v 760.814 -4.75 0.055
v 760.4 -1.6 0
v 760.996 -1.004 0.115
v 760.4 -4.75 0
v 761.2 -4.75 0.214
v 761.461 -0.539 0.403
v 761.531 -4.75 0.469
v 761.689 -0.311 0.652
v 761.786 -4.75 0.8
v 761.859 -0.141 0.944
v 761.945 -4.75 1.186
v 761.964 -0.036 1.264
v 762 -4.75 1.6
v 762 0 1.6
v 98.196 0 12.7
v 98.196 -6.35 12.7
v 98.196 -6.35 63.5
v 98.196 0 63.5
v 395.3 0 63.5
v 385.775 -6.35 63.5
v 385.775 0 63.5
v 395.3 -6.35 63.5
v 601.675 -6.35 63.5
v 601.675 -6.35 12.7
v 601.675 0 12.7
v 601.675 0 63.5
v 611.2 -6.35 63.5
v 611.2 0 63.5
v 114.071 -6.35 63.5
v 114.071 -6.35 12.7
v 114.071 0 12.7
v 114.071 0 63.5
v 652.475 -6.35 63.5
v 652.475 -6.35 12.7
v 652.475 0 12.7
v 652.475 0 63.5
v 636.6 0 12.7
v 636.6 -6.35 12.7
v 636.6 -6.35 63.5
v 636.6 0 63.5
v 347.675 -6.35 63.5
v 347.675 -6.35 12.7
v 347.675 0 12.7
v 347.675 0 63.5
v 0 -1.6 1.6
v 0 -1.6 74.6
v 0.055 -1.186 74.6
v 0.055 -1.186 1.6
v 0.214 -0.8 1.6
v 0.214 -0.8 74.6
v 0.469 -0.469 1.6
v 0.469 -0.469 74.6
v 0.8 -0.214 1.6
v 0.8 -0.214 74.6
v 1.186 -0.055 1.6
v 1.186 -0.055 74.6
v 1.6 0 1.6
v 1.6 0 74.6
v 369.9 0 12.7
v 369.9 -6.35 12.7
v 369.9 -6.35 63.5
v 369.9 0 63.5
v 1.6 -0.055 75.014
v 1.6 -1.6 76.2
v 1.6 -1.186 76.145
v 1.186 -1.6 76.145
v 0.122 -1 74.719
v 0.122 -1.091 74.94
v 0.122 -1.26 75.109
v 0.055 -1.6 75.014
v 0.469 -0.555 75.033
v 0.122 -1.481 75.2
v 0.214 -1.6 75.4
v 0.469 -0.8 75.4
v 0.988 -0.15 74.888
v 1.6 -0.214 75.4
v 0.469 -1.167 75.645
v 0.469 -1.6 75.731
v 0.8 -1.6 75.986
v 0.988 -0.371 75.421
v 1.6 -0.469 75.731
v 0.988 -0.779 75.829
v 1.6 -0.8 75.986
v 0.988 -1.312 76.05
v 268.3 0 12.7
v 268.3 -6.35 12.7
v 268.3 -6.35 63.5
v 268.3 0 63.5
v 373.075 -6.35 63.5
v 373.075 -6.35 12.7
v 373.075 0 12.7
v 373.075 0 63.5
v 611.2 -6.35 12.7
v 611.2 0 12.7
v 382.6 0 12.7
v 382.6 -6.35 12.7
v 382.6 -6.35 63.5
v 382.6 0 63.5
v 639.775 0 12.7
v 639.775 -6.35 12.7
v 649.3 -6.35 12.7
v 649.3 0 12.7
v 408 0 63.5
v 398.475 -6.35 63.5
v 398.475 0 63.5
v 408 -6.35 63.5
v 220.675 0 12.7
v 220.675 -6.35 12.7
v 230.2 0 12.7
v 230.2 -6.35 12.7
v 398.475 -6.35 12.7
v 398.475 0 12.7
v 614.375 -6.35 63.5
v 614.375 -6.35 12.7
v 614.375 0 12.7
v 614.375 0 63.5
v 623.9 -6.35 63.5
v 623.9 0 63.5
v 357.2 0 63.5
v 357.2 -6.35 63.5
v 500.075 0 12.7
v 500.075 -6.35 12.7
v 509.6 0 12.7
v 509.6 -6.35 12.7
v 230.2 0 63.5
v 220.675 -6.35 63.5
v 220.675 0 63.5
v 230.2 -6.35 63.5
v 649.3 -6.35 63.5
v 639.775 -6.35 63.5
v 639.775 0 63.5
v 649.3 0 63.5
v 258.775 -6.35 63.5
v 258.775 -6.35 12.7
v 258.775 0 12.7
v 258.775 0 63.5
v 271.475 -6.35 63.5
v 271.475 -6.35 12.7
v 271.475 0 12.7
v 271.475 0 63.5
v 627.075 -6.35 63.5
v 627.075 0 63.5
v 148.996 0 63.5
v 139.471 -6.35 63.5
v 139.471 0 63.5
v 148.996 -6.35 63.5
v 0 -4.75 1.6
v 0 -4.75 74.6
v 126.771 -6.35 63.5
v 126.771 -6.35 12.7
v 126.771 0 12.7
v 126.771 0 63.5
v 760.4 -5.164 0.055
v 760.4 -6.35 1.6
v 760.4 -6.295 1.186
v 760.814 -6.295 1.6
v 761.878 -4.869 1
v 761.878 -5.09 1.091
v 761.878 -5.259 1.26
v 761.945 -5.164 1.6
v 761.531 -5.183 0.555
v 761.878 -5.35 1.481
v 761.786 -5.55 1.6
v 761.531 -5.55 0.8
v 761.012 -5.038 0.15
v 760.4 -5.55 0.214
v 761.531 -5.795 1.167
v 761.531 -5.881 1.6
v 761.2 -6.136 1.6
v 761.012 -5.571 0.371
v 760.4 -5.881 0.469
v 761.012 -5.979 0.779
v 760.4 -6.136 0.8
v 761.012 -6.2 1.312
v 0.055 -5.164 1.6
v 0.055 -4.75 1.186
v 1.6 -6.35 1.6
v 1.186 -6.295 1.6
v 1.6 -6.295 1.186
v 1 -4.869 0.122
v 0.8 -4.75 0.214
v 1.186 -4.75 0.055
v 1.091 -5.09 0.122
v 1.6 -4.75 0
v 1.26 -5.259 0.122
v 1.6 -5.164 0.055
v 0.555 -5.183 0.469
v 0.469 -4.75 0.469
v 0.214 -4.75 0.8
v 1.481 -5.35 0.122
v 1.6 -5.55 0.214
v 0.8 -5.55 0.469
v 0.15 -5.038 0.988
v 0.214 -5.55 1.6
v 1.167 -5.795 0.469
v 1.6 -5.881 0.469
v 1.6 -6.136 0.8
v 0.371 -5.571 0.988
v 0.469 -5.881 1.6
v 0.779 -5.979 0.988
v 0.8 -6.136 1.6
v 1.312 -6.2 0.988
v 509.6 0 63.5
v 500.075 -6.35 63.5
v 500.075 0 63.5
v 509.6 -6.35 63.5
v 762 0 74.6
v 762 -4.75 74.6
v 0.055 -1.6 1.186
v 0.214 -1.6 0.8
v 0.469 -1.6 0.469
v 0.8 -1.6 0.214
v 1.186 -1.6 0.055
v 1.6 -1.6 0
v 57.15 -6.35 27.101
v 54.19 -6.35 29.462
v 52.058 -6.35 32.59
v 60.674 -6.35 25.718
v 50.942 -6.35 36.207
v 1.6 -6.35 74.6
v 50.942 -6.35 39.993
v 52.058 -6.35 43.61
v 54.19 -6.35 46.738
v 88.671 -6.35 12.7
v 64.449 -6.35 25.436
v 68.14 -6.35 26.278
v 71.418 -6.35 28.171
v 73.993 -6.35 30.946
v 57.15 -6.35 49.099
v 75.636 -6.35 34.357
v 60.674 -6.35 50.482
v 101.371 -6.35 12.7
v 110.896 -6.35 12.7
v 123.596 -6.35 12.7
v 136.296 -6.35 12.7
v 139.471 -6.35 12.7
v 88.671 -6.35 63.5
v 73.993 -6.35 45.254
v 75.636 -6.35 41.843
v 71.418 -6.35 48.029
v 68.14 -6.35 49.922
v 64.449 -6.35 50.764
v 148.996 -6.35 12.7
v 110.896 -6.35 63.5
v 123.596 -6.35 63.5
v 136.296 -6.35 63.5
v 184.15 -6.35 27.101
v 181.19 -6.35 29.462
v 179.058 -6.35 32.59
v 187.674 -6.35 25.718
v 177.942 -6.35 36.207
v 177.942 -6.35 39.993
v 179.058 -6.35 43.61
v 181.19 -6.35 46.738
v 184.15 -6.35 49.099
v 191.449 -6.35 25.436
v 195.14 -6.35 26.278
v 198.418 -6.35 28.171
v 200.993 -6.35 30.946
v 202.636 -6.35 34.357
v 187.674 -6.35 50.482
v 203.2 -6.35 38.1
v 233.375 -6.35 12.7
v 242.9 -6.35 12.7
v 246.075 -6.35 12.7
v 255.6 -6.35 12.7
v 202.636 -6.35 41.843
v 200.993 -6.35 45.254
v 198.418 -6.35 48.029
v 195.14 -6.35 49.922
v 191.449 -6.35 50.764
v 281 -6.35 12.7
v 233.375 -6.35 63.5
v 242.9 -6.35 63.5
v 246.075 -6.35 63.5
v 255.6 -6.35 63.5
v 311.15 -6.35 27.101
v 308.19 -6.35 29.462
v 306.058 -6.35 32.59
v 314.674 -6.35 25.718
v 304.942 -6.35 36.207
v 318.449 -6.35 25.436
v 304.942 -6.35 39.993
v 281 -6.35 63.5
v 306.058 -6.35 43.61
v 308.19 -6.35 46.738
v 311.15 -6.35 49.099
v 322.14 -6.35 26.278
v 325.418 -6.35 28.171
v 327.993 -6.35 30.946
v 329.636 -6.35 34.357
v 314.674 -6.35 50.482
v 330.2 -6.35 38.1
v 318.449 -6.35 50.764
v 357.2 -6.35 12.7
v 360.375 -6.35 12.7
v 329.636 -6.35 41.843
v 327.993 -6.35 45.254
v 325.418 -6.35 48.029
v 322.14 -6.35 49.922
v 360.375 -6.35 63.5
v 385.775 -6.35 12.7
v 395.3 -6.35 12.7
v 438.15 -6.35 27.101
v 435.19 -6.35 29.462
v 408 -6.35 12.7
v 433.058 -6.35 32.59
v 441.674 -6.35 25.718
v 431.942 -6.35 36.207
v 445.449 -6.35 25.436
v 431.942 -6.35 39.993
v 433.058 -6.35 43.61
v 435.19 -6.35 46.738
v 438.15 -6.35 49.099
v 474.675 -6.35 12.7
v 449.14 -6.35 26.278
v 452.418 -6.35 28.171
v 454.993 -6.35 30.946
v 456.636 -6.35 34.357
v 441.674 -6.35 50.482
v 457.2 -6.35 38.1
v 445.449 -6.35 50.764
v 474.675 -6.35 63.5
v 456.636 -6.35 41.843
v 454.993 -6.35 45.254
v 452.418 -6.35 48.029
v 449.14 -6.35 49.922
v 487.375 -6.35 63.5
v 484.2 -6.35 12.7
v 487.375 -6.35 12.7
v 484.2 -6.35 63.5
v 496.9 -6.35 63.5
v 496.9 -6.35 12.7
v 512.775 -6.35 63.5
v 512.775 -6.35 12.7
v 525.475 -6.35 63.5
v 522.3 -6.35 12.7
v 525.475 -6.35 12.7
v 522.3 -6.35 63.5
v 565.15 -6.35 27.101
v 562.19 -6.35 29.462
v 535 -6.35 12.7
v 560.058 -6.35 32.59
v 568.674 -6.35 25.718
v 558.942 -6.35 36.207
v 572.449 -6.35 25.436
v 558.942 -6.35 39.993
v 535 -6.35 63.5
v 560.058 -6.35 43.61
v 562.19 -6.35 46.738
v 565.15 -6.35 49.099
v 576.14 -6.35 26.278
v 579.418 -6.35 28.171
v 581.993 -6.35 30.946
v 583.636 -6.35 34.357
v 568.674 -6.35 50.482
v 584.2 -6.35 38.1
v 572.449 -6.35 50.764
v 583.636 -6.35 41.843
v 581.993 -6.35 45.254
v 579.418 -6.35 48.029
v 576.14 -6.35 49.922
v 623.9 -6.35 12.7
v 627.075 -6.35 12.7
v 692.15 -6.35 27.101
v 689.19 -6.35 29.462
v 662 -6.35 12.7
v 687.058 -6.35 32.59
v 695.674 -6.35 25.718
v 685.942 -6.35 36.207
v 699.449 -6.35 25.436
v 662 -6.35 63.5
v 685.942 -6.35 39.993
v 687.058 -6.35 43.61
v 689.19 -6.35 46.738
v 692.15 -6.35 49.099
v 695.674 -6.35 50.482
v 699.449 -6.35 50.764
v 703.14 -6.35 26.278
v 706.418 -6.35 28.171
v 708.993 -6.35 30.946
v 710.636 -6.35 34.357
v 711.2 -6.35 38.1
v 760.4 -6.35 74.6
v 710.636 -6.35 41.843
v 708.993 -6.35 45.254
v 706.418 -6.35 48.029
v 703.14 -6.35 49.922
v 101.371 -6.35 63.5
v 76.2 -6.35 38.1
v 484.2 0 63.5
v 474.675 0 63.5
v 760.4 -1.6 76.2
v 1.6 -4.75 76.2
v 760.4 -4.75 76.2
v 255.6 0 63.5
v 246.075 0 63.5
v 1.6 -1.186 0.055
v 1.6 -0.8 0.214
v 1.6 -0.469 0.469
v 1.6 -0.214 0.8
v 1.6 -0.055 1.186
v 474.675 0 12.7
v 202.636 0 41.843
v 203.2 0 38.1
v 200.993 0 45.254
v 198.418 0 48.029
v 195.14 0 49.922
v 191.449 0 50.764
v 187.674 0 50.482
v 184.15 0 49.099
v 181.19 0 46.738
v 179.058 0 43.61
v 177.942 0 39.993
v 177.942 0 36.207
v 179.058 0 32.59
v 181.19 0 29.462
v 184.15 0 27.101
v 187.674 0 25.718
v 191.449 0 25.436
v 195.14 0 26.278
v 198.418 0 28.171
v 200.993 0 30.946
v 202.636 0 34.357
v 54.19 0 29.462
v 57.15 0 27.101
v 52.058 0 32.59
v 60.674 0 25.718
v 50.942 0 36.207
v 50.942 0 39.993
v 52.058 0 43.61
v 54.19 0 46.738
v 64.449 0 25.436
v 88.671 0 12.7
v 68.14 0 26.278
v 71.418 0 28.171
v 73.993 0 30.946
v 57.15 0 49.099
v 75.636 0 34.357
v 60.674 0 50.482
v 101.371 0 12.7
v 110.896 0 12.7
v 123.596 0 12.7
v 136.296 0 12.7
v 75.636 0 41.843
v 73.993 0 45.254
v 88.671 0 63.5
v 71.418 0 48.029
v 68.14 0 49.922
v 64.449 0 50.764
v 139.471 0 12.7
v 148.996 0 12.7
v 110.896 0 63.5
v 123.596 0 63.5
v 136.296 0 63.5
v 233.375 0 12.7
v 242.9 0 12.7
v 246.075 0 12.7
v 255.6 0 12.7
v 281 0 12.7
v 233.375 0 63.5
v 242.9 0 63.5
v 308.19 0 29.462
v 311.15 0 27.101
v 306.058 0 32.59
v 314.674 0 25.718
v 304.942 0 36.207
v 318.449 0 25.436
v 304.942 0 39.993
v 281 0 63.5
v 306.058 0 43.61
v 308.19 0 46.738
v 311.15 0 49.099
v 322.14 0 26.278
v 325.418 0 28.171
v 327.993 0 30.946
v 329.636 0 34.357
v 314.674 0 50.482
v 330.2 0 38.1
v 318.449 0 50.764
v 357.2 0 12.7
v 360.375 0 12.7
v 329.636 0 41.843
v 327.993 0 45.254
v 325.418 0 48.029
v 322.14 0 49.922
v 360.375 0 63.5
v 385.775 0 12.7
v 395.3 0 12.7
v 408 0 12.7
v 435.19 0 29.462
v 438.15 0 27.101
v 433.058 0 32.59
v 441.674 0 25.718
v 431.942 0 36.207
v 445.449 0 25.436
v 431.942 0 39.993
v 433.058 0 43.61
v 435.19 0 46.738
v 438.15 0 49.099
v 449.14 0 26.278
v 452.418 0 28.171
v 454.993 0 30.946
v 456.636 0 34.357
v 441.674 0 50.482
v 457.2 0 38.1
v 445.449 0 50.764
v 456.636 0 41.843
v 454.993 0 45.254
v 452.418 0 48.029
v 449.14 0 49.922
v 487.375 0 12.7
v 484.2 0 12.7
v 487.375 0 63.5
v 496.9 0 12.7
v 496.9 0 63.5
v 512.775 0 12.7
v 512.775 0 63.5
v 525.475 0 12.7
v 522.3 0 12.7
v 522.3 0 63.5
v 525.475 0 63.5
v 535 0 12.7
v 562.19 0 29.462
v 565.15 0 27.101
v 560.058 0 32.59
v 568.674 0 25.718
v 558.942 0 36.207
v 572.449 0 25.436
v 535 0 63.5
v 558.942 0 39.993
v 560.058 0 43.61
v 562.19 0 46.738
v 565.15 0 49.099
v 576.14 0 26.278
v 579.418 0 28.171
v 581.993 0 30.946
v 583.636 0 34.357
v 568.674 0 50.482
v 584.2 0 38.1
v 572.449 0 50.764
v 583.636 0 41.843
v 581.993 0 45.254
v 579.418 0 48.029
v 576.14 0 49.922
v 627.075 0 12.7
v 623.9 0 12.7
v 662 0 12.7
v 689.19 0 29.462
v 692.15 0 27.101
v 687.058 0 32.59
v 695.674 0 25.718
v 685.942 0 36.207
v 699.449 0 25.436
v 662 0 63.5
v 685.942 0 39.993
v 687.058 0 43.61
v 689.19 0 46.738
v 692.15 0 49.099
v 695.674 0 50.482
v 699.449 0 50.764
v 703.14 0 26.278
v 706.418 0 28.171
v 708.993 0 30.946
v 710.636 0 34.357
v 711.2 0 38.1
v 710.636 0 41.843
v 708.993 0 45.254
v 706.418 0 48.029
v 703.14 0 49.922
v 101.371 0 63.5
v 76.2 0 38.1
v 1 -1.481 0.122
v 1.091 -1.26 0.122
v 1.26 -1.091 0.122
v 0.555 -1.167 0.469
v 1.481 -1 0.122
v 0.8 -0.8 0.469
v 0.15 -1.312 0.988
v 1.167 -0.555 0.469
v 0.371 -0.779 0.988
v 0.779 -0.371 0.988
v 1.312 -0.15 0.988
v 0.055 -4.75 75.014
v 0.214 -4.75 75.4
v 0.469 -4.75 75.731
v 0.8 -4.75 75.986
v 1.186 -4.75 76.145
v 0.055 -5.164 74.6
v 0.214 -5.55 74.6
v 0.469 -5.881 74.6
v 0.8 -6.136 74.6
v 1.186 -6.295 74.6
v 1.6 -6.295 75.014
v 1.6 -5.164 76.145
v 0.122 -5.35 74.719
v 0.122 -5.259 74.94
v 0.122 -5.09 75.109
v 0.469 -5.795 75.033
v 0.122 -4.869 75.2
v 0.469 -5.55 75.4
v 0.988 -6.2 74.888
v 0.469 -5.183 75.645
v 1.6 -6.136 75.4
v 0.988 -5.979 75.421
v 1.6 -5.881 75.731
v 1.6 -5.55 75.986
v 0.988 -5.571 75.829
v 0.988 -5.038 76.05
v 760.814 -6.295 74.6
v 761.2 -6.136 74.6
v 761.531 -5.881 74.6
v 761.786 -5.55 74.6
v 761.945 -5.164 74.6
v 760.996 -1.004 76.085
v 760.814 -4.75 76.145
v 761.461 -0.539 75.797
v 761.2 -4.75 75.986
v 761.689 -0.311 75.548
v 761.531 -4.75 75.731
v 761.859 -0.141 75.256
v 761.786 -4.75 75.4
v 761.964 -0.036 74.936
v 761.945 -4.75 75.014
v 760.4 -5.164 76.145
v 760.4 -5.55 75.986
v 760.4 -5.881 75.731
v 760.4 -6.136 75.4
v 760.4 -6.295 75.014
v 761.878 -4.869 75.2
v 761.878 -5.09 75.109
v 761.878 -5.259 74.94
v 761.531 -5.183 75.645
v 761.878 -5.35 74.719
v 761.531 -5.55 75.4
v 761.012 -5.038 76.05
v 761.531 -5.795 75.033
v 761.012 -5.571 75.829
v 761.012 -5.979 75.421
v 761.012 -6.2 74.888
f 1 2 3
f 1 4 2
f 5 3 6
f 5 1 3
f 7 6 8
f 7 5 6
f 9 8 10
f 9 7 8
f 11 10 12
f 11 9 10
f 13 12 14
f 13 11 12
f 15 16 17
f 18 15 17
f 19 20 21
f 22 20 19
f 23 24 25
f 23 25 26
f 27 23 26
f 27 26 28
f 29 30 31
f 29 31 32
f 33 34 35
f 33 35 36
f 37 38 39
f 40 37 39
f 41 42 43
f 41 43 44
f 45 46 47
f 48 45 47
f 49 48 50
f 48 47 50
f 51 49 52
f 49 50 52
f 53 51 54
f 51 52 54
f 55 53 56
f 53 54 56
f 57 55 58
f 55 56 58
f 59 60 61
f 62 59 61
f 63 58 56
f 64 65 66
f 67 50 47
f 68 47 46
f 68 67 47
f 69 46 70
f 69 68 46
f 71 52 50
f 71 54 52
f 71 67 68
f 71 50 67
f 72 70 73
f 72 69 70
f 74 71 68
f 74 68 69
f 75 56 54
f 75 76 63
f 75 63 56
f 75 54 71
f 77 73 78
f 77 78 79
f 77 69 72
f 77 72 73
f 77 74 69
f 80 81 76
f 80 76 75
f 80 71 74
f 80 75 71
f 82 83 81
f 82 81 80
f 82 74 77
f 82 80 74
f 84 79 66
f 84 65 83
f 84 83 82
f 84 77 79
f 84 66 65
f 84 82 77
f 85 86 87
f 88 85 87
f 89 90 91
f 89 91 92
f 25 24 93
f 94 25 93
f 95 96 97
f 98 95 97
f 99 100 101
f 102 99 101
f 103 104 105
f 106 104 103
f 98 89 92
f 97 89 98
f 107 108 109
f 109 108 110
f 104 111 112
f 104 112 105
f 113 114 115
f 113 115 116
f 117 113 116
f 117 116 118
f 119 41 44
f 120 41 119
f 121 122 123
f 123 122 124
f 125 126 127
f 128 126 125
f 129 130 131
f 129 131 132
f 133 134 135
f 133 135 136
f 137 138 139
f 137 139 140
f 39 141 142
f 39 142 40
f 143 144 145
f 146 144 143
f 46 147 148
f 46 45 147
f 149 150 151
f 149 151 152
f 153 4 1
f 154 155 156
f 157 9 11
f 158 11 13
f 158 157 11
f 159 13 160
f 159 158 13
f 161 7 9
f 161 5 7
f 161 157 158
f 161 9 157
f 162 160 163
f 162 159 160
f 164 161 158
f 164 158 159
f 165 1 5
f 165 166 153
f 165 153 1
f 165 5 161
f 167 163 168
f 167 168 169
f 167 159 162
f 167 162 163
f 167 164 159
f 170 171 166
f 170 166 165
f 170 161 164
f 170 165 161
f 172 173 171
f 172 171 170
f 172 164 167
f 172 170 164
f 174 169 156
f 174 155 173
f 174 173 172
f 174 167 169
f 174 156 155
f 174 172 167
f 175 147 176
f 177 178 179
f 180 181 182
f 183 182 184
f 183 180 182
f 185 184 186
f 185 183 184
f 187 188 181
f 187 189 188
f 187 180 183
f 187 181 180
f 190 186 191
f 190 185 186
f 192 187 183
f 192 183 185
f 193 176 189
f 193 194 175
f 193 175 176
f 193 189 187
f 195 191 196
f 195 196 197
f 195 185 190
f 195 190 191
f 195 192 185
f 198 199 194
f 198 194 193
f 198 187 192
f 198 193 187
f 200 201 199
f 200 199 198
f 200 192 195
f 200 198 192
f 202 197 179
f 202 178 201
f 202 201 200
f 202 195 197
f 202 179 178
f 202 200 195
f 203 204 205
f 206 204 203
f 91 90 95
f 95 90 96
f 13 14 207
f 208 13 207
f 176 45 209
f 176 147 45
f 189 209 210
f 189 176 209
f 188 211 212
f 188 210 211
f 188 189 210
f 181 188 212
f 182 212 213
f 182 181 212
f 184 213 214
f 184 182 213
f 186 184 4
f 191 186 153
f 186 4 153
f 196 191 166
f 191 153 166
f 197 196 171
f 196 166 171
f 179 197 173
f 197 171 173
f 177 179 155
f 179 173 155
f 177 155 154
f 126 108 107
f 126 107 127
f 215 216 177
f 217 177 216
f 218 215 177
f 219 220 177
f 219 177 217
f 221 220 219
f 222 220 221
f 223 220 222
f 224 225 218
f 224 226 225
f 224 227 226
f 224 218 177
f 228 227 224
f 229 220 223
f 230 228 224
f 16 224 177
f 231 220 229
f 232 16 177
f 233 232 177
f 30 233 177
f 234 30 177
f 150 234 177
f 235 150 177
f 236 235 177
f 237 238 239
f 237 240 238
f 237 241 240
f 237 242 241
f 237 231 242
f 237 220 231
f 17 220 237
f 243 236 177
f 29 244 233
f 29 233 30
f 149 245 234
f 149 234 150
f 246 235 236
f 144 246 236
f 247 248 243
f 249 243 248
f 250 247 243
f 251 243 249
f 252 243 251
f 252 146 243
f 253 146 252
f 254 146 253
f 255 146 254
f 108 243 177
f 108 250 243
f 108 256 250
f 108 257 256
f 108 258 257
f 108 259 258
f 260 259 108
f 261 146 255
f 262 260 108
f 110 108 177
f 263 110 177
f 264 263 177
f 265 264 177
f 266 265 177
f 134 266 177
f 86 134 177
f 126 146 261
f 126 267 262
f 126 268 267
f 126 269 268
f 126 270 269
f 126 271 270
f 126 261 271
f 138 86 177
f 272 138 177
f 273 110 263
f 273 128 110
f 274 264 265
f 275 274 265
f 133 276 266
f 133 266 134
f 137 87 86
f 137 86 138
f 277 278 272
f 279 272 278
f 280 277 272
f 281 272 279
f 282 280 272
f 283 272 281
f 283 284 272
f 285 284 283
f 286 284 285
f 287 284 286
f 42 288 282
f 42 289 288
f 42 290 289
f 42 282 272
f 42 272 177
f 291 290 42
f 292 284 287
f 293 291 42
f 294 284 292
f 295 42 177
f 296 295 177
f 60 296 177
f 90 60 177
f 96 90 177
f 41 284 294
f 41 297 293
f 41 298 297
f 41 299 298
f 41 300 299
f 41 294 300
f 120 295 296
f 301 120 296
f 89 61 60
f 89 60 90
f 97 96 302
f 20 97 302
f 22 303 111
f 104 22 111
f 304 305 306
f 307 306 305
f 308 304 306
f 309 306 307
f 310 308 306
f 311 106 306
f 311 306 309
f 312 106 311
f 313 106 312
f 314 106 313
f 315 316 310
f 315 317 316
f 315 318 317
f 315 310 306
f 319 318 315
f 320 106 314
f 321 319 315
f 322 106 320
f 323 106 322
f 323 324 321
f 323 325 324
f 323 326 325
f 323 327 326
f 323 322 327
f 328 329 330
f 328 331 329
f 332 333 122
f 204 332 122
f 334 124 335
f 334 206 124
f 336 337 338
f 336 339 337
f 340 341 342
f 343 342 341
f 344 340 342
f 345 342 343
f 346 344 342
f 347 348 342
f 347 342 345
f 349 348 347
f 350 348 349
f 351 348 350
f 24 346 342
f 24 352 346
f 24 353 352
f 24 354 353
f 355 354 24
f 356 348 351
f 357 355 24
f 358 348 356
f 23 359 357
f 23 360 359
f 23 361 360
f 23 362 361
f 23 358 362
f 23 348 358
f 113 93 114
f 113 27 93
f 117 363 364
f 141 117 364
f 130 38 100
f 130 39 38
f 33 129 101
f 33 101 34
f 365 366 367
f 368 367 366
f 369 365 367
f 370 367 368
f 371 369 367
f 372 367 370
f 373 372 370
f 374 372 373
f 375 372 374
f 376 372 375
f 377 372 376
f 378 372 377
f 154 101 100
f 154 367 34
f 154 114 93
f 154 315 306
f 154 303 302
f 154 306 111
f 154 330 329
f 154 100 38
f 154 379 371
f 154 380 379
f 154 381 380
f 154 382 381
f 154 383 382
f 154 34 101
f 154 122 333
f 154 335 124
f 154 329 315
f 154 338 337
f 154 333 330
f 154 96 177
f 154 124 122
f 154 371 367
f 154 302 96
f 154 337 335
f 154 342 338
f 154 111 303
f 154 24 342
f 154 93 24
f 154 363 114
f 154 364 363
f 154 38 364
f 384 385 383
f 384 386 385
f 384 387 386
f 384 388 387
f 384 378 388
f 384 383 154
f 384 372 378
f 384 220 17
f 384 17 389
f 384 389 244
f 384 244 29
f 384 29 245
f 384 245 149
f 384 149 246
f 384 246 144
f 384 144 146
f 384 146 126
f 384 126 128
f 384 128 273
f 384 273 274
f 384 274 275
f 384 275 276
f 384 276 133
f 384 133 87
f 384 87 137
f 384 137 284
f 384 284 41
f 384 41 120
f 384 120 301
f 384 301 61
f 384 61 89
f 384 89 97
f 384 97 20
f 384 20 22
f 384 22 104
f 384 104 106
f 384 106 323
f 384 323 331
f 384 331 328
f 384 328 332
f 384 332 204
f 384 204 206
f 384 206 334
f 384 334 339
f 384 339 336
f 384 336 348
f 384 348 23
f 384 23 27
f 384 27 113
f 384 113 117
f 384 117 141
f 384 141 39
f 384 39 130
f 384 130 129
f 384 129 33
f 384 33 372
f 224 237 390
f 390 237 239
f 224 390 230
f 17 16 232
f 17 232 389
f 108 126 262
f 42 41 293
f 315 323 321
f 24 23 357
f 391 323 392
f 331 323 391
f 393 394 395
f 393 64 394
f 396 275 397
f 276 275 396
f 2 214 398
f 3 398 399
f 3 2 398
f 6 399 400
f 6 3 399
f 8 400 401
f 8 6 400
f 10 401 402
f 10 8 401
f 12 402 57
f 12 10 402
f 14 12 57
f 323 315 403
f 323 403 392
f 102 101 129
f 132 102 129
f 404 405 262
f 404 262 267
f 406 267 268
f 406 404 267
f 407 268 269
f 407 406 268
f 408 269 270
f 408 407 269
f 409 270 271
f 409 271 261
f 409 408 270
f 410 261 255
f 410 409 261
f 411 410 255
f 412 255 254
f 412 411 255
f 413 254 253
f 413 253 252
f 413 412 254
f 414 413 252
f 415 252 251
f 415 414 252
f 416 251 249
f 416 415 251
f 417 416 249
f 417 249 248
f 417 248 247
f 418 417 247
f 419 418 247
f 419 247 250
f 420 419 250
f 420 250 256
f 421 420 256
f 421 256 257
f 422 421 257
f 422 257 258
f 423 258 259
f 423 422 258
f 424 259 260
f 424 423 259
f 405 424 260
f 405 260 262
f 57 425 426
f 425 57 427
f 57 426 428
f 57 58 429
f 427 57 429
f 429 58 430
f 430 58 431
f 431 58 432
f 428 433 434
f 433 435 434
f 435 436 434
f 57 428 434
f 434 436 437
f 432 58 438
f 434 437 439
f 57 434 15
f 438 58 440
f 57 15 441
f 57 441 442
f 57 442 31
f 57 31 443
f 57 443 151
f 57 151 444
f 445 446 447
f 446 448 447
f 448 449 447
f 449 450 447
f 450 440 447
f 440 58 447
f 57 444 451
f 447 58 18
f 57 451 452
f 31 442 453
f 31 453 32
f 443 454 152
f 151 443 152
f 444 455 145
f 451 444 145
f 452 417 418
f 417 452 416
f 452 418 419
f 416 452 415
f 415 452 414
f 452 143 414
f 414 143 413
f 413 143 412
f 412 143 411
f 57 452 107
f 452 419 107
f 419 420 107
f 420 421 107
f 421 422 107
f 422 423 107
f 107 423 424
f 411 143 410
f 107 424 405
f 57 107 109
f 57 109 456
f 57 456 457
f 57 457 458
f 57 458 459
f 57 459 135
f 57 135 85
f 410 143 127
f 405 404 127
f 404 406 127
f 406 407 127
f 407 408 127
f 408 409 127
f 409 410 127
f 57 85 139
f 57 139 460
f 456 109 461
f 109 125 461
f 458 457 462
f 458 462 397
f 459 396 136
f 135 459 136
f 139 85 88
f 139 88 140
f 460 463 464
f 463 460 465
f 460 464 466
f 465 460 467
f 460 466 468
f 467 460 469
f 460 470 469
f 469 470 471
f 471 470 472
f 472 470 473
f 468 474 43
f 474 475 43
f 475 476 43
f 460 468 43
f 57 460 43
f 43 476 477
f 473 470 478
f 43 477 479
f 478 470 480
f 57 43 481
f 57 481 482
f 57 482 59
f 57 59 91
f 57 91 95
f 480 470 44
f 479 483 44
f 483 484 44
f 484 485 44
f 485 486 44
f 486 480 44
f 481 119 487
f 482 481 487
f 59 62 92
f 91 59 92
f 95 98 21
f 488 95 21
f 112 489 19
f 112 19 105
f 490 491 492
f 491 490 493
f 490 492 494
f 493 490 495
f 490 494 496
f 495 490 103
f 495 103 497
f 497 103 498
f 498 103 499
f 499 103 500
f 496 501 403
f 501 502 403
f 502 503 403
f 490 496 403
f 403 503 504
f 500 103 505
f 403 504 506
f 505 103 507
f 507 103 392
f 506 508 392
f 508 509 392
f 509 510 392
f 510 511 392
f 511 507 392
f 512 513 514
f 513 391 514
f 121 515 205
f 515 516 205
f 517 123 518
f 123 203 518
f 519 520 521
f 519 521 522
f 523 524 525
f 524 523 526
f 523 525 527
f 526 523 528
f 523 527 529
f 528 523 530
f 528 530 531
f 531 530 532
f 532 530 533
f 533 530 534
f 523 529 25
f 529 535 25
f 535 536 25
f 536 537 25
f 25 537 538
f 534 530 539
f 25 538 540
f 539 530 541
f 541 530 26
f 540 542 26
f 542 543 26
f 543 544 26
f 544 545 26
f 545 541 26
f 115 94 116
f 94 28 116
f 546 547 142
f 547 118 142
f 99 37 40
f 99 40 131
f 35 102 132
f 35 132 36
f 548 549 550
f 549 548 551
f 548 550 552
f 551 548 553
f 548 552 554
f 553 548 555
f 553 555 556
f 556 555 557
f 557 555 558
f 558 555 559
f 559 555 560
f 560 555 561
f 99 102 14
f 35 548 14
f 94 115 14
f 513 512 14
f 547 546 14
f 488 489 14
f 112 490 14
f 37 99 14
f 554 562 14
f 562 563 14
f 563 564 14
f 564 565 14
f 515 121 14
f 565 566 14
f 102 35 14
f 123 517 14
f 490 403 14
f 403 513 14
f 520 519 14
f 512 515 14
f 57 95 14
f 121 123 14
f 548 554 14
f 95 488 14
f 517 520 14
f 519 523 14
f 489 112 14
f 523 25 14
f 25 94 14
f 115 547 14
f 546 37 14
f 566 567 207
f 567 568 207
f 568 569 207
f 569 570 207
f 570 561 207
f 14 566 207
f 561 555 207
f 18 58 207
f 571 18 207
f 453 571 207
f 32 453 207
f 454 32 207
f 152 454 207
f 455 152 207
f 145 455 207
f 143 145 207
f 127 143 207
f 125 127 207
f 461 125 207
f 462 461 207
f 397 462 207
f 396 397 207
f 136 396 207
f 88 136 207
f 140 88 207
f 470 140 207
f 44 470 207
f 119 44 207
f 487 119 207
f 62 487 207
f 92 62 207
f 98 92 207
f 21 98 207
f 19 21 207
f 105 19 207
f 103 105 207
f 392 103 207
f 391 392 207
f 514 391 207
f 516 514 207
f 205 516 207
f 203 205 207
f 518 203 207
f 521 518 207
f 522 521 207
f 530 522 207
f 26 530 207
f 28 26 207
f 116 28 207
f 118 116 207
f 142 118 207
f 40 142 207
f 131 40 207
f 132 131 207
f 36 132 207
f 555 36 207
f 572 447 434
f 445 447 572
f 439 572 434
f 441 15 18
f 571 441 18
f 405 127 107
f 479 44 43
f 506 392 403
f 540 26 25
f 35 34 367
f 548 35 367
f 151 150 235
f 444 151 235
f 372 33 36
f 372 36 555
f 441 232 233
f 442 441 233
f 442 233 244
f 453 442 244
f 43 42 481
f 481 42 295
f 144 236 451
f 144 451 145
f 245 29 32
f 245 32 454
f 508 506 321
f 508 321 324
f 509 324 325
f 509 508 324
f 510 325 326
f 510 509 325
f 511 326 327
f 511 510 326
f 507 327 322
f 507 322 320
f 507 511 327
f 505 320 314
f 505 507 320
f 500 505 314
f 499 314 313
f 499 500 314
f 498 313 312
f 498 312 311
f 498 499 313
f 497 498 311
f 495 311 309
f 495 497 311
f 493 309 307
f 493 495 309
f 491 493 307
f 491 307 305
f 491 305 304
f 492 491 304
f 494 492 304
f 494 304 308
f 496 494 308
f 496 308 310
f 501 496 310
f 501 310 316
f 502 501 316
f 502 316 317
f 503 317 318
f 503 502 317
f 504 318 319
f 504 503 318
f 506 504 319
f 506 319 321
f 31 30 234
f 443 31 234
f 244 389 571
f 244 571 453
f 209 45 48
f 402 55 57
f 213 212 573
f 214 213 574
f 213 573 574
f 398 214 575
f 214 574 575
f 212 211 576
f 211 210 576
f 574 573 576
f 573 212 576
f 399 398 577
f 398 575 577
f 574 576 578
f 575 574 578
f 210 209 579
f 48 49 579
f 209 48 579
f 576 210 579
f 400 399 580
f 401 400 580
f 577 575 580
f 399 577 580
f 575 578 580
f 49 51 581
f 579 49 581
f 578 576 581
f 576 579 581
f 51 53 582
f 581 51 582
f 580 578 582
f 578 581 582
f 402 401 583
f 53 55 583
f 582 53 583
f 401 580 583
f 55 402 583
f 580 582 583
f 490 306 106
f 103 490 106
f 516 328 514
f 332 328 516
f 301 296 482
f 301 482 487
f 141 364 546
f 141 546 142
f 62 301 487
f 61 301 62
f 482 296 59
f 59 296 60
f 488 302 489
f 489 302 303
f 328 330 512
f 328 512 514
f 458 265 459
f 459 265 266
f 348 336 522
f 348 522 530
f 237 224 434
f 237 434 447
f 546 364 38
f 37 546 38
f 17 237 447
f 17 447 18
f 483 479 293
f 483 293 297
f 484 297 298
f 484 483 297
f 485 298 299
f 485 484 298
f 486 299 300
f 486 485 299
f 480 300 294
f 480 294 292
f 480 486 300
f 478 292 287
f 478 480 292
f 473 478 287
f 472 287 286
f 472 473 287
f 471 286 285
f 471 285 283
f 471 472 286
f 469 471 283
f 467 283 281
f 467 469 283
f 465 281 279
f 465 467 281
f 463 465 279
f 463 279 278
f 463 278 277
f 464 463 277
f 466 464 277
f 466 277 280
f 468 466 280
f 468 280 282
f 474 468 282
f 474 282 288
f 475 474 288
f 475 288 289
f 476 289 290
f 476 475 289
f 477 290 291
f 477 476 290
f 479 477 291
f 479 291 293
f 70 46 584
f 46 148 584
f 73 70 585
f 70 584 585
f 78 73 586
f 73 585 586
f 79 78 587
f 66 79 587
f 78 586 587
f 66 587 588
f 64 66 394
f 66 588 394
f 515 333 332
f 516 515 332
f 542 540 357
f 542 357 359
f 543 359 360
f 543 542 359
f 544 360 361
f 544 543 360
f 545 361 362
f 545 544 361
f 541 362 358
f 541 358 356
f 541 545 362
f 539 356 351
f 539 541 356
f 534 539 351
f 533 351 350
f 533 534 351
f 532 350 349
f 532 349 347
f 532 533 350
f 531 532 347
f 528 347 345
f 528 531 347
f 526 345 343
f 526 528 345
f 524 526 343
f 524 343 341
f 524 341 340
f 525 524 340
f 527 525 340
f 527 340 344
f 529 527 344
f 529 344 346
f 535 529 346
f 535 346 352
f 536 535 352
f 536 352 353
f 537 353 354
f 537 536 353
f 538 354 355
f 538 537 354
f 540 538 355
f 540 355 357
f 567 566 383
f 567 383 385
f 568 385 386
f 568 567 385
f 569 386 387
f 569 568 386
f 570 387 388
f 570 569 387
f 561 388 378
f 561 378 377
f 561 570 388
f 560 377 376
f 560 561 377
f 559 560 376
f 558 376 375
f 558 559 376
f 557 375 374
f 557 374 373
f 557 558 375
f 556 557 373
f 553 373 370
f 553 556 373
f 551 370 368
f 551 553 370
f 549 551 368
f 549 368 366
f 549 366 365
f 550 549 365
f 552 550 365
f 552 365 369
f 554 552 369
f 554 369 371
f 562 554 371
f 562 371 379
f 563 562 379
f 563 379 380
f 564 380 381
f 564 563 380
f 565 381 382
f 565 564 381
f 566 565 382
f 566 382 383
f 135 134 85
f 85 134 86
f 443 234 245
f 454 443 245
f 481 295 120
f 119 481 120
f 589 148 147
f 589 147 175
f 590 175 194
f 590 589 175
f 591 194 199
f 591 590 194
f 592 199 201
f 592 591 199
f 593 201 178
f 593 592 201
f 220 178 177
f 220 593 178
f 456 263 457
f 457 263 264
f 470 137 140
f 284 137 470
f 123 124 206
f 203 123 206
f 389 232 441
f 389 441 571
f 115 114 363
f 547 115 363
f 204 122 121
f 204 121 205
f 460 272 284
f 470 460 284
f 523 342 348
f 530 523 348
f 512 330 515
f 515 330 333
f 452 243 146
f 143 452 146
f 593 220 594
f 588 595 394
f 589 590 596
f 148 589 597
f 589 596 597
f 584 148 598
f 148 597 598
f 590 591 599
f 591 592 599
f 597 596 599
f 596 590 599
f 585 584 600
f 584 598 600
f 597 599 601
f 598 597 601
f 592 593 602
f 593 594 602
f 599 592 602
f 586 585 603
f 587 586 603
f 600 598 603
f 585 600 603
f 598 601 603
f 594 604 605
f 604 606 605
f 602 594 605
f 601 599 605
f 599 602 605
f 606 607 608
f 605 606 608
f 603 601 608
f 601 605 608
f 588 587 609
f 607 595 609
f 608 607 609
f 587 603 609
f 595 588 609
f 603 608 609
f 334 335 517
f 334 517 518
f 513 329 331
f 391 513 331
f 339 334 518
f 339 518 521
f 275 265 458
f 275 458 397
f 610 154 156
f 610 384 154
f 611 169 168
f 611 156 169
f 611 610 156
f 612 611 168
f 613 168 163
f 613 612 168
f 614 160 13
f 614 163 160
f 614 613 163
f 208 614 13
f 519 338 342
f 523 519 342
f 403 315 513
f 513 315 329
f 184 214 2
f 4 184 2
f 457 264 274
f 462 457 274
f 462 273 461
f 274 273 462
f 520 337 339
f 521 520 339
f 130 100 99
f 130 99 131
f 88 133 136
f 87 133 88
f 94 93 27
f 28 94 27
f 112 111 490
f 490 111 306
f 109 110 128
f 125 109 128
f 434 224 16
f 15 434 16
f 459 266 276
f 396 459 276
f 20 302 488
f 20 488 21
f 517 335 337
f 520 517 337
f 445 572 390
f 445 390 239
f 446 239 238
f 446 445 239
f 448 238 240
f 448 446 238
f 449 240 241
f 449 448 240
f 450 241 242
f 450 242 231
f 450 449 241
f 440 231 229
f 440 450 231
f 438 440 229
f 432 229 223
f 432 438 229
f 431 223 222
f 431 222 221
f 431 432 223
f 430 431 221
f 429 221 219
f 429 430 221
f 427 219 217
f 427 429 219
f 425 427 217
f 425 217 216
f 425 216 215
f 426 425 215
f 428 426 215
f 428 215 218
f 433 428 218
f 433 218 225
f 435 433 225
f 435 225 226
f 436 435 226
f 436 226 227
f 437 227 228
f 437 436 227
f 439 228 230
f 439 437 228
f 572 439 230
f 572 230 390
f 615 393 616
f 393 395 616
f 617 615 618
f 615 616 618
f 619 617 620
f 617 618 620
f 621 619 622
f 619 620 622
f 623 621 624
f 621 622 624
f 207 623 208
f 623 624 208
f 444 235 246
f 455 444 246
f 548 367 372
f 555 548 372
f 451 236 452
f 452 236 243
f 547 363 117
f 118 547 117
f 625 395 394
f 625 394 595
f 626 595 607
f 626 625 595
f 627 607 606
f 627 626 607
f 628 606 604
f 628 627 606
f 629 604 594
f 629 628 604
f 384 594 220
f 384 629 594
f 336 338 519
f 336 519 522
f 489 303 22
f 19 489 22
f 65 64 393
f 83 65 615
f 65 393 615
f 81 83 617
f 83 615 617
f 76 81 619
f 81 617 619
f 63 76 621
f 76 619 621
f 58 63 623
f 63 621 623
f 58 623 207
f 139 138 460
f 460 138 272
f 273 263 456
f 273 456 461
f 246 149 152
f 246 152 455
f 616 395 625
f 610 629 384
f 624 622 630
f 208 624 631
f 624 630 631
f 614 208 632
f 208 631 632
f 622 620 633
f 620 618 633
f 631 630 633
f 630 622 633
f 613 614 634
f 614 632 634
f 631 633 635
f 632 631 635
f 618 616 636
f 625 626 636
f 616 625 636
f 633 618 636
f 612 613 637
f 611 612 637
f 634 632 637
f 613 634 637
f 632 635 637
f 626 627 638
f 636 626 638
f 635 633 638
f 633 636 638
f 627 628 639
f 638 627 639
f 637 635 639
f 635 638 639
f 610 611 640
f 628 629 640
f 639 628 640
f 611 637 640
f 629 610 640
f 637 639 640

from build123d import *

# Parameters (mm, degrees)
F0_W     = 762
F0_H     = 76.2
F0_R     = 12.7
F1_DEPTH = 6.35
F2_W     = 9.525
F2_H     = 50.8
F3_DEPTH = 6.351
F4_R     = 1.6002


with BuildPart() as f1:
    # F0 (on Front) → F1 (new body)
    with BuildSketch(Plane.XZ):
        with Locations((381, 38.1)):
            Rectangle(F0_W, F0_H)
        with Locations((63.5, 38.1)):
            Circle(F0_R, mode=Mode.SUBTRACT)
        with Locations((190.5, 38.1)):
            Circle(F0_R, mode=Mode.SUBTRACT)
        with Locations((317.5, 38.1)):
            Circle(F0_R, mode=Mode.SUBTRACT)
        with Locations((444.5, 38.1)):
            Circle(F0_R, mode=Mode.SUBTRACT)
        with Locations((571.5, 38.1)):
            Circle(F0_R, mode=Mode.SUBTRACT)
        with Locations((698.5, 38.1)):
            Circle(F0_R, mode=Mode.SUBTRACT)
    extrude(amount=F1_DEPTH)

    # F2 (on face) → F3 (cut, through all)
    with BuildSketch(Plane.XZ.offset(6.35)):
        with Locations((93.4339, 38.1)):
            Rectangle(F2_W, F2_H)
        with Locations((106.1339, 38.1)):
            Rectangle(F2_W, F2_H)
        with Locations((118.8339, 38.1)):
            Rectangle(F2_W, F2_H)
        with Locations((131.5339, 38.1)):
            Rectangle(F2_W, F2_H)
        with Locations((144.2339, 38.1)):
            Rectangle(F2_W, F2_H)
        with Locations((225.4377, 38.1)):
            Rectangle(F2_W, F2_H)
        with Locations((238.1377, 38.1)):
            Rectangle(F2_W, F2_H)
        with Locations((250.8377, 38.1)):
            Rectangle(F2_W, F2_H)
        with Locations((263.5377, 38.1)):
            Rectangle(F2_W, F2_H)
        with Locations((276.2377, 38.1)):
            Rectangle(F2_W, F2_H)
        with Locations((352.4377, 38.1)):
            Rectangle(F2_W, F2_H)
        with Locations((365.1377, 38.1)):
            Rectangle(F2_W, F2_H)
        with Locations((377.8377, 38.1)):
            Rectangle(F2_W, F2_H)
        with Locations((390.5377, 38.1)):
            Rectangle(F2_W, F2_H)
        with Locations((403.2377, 38.1)):
            Rectangle(F2_W, F2_H)
        with Locations((479.4377, 38.1)):
            Rectangle(F2_W, F2_H)
        with Locations((492.1377, 38.1)):
            Rectangle(F2_W, F2_H)
        with Locations((504.8377, 38.1)):
            Rectangle(F2_W, F2_H)
        with Locations((517.5377, 38.1)):
            Rectangle(F2_W, F2_H)
        with Locations((530.2377, 38.1)):
            Rectangle(F2_W, F2_H)
        with Locations((606.4377, 38.1)):
            Rectangle(F2_W, F2_H)
        with Locations((619.1377, 38.1)):
            Rectangle(F2_W, F2_H)
        with Locations((631.8377, 38.1)):
            Rectangle(F2_W, F2_H)
        with Locations((644.5377, 38.1)):
            Rectangle(F2_W, F2_H)
        with Locations((657.2377, 38.1)):
            Rectangle(F2_W, F2_H)
    extrude(amount=-F3_DEPTH, mode=Mode.SUBTRACT)

    # F4
    f4_edges = [f1.edges().sort_by_distance(p)[0] for p in [
        (381, -6.35, 76.2),
        (381, 0, 76.2),
        (0, -6.35, 38.1),
        (0, 0, 38.1),
        (762, -3.175, 76.2),
        (0, -3.175, 76.2),
        (0, -3.175, 0),
        (381, -6.35, 0),
        (381, 0, 0),
        (762, -3.175, 0),
        (762, -6.35, 38.1),
    ]]
    fillet(f4_edges, radius=F4_R)


solid = f1.part
